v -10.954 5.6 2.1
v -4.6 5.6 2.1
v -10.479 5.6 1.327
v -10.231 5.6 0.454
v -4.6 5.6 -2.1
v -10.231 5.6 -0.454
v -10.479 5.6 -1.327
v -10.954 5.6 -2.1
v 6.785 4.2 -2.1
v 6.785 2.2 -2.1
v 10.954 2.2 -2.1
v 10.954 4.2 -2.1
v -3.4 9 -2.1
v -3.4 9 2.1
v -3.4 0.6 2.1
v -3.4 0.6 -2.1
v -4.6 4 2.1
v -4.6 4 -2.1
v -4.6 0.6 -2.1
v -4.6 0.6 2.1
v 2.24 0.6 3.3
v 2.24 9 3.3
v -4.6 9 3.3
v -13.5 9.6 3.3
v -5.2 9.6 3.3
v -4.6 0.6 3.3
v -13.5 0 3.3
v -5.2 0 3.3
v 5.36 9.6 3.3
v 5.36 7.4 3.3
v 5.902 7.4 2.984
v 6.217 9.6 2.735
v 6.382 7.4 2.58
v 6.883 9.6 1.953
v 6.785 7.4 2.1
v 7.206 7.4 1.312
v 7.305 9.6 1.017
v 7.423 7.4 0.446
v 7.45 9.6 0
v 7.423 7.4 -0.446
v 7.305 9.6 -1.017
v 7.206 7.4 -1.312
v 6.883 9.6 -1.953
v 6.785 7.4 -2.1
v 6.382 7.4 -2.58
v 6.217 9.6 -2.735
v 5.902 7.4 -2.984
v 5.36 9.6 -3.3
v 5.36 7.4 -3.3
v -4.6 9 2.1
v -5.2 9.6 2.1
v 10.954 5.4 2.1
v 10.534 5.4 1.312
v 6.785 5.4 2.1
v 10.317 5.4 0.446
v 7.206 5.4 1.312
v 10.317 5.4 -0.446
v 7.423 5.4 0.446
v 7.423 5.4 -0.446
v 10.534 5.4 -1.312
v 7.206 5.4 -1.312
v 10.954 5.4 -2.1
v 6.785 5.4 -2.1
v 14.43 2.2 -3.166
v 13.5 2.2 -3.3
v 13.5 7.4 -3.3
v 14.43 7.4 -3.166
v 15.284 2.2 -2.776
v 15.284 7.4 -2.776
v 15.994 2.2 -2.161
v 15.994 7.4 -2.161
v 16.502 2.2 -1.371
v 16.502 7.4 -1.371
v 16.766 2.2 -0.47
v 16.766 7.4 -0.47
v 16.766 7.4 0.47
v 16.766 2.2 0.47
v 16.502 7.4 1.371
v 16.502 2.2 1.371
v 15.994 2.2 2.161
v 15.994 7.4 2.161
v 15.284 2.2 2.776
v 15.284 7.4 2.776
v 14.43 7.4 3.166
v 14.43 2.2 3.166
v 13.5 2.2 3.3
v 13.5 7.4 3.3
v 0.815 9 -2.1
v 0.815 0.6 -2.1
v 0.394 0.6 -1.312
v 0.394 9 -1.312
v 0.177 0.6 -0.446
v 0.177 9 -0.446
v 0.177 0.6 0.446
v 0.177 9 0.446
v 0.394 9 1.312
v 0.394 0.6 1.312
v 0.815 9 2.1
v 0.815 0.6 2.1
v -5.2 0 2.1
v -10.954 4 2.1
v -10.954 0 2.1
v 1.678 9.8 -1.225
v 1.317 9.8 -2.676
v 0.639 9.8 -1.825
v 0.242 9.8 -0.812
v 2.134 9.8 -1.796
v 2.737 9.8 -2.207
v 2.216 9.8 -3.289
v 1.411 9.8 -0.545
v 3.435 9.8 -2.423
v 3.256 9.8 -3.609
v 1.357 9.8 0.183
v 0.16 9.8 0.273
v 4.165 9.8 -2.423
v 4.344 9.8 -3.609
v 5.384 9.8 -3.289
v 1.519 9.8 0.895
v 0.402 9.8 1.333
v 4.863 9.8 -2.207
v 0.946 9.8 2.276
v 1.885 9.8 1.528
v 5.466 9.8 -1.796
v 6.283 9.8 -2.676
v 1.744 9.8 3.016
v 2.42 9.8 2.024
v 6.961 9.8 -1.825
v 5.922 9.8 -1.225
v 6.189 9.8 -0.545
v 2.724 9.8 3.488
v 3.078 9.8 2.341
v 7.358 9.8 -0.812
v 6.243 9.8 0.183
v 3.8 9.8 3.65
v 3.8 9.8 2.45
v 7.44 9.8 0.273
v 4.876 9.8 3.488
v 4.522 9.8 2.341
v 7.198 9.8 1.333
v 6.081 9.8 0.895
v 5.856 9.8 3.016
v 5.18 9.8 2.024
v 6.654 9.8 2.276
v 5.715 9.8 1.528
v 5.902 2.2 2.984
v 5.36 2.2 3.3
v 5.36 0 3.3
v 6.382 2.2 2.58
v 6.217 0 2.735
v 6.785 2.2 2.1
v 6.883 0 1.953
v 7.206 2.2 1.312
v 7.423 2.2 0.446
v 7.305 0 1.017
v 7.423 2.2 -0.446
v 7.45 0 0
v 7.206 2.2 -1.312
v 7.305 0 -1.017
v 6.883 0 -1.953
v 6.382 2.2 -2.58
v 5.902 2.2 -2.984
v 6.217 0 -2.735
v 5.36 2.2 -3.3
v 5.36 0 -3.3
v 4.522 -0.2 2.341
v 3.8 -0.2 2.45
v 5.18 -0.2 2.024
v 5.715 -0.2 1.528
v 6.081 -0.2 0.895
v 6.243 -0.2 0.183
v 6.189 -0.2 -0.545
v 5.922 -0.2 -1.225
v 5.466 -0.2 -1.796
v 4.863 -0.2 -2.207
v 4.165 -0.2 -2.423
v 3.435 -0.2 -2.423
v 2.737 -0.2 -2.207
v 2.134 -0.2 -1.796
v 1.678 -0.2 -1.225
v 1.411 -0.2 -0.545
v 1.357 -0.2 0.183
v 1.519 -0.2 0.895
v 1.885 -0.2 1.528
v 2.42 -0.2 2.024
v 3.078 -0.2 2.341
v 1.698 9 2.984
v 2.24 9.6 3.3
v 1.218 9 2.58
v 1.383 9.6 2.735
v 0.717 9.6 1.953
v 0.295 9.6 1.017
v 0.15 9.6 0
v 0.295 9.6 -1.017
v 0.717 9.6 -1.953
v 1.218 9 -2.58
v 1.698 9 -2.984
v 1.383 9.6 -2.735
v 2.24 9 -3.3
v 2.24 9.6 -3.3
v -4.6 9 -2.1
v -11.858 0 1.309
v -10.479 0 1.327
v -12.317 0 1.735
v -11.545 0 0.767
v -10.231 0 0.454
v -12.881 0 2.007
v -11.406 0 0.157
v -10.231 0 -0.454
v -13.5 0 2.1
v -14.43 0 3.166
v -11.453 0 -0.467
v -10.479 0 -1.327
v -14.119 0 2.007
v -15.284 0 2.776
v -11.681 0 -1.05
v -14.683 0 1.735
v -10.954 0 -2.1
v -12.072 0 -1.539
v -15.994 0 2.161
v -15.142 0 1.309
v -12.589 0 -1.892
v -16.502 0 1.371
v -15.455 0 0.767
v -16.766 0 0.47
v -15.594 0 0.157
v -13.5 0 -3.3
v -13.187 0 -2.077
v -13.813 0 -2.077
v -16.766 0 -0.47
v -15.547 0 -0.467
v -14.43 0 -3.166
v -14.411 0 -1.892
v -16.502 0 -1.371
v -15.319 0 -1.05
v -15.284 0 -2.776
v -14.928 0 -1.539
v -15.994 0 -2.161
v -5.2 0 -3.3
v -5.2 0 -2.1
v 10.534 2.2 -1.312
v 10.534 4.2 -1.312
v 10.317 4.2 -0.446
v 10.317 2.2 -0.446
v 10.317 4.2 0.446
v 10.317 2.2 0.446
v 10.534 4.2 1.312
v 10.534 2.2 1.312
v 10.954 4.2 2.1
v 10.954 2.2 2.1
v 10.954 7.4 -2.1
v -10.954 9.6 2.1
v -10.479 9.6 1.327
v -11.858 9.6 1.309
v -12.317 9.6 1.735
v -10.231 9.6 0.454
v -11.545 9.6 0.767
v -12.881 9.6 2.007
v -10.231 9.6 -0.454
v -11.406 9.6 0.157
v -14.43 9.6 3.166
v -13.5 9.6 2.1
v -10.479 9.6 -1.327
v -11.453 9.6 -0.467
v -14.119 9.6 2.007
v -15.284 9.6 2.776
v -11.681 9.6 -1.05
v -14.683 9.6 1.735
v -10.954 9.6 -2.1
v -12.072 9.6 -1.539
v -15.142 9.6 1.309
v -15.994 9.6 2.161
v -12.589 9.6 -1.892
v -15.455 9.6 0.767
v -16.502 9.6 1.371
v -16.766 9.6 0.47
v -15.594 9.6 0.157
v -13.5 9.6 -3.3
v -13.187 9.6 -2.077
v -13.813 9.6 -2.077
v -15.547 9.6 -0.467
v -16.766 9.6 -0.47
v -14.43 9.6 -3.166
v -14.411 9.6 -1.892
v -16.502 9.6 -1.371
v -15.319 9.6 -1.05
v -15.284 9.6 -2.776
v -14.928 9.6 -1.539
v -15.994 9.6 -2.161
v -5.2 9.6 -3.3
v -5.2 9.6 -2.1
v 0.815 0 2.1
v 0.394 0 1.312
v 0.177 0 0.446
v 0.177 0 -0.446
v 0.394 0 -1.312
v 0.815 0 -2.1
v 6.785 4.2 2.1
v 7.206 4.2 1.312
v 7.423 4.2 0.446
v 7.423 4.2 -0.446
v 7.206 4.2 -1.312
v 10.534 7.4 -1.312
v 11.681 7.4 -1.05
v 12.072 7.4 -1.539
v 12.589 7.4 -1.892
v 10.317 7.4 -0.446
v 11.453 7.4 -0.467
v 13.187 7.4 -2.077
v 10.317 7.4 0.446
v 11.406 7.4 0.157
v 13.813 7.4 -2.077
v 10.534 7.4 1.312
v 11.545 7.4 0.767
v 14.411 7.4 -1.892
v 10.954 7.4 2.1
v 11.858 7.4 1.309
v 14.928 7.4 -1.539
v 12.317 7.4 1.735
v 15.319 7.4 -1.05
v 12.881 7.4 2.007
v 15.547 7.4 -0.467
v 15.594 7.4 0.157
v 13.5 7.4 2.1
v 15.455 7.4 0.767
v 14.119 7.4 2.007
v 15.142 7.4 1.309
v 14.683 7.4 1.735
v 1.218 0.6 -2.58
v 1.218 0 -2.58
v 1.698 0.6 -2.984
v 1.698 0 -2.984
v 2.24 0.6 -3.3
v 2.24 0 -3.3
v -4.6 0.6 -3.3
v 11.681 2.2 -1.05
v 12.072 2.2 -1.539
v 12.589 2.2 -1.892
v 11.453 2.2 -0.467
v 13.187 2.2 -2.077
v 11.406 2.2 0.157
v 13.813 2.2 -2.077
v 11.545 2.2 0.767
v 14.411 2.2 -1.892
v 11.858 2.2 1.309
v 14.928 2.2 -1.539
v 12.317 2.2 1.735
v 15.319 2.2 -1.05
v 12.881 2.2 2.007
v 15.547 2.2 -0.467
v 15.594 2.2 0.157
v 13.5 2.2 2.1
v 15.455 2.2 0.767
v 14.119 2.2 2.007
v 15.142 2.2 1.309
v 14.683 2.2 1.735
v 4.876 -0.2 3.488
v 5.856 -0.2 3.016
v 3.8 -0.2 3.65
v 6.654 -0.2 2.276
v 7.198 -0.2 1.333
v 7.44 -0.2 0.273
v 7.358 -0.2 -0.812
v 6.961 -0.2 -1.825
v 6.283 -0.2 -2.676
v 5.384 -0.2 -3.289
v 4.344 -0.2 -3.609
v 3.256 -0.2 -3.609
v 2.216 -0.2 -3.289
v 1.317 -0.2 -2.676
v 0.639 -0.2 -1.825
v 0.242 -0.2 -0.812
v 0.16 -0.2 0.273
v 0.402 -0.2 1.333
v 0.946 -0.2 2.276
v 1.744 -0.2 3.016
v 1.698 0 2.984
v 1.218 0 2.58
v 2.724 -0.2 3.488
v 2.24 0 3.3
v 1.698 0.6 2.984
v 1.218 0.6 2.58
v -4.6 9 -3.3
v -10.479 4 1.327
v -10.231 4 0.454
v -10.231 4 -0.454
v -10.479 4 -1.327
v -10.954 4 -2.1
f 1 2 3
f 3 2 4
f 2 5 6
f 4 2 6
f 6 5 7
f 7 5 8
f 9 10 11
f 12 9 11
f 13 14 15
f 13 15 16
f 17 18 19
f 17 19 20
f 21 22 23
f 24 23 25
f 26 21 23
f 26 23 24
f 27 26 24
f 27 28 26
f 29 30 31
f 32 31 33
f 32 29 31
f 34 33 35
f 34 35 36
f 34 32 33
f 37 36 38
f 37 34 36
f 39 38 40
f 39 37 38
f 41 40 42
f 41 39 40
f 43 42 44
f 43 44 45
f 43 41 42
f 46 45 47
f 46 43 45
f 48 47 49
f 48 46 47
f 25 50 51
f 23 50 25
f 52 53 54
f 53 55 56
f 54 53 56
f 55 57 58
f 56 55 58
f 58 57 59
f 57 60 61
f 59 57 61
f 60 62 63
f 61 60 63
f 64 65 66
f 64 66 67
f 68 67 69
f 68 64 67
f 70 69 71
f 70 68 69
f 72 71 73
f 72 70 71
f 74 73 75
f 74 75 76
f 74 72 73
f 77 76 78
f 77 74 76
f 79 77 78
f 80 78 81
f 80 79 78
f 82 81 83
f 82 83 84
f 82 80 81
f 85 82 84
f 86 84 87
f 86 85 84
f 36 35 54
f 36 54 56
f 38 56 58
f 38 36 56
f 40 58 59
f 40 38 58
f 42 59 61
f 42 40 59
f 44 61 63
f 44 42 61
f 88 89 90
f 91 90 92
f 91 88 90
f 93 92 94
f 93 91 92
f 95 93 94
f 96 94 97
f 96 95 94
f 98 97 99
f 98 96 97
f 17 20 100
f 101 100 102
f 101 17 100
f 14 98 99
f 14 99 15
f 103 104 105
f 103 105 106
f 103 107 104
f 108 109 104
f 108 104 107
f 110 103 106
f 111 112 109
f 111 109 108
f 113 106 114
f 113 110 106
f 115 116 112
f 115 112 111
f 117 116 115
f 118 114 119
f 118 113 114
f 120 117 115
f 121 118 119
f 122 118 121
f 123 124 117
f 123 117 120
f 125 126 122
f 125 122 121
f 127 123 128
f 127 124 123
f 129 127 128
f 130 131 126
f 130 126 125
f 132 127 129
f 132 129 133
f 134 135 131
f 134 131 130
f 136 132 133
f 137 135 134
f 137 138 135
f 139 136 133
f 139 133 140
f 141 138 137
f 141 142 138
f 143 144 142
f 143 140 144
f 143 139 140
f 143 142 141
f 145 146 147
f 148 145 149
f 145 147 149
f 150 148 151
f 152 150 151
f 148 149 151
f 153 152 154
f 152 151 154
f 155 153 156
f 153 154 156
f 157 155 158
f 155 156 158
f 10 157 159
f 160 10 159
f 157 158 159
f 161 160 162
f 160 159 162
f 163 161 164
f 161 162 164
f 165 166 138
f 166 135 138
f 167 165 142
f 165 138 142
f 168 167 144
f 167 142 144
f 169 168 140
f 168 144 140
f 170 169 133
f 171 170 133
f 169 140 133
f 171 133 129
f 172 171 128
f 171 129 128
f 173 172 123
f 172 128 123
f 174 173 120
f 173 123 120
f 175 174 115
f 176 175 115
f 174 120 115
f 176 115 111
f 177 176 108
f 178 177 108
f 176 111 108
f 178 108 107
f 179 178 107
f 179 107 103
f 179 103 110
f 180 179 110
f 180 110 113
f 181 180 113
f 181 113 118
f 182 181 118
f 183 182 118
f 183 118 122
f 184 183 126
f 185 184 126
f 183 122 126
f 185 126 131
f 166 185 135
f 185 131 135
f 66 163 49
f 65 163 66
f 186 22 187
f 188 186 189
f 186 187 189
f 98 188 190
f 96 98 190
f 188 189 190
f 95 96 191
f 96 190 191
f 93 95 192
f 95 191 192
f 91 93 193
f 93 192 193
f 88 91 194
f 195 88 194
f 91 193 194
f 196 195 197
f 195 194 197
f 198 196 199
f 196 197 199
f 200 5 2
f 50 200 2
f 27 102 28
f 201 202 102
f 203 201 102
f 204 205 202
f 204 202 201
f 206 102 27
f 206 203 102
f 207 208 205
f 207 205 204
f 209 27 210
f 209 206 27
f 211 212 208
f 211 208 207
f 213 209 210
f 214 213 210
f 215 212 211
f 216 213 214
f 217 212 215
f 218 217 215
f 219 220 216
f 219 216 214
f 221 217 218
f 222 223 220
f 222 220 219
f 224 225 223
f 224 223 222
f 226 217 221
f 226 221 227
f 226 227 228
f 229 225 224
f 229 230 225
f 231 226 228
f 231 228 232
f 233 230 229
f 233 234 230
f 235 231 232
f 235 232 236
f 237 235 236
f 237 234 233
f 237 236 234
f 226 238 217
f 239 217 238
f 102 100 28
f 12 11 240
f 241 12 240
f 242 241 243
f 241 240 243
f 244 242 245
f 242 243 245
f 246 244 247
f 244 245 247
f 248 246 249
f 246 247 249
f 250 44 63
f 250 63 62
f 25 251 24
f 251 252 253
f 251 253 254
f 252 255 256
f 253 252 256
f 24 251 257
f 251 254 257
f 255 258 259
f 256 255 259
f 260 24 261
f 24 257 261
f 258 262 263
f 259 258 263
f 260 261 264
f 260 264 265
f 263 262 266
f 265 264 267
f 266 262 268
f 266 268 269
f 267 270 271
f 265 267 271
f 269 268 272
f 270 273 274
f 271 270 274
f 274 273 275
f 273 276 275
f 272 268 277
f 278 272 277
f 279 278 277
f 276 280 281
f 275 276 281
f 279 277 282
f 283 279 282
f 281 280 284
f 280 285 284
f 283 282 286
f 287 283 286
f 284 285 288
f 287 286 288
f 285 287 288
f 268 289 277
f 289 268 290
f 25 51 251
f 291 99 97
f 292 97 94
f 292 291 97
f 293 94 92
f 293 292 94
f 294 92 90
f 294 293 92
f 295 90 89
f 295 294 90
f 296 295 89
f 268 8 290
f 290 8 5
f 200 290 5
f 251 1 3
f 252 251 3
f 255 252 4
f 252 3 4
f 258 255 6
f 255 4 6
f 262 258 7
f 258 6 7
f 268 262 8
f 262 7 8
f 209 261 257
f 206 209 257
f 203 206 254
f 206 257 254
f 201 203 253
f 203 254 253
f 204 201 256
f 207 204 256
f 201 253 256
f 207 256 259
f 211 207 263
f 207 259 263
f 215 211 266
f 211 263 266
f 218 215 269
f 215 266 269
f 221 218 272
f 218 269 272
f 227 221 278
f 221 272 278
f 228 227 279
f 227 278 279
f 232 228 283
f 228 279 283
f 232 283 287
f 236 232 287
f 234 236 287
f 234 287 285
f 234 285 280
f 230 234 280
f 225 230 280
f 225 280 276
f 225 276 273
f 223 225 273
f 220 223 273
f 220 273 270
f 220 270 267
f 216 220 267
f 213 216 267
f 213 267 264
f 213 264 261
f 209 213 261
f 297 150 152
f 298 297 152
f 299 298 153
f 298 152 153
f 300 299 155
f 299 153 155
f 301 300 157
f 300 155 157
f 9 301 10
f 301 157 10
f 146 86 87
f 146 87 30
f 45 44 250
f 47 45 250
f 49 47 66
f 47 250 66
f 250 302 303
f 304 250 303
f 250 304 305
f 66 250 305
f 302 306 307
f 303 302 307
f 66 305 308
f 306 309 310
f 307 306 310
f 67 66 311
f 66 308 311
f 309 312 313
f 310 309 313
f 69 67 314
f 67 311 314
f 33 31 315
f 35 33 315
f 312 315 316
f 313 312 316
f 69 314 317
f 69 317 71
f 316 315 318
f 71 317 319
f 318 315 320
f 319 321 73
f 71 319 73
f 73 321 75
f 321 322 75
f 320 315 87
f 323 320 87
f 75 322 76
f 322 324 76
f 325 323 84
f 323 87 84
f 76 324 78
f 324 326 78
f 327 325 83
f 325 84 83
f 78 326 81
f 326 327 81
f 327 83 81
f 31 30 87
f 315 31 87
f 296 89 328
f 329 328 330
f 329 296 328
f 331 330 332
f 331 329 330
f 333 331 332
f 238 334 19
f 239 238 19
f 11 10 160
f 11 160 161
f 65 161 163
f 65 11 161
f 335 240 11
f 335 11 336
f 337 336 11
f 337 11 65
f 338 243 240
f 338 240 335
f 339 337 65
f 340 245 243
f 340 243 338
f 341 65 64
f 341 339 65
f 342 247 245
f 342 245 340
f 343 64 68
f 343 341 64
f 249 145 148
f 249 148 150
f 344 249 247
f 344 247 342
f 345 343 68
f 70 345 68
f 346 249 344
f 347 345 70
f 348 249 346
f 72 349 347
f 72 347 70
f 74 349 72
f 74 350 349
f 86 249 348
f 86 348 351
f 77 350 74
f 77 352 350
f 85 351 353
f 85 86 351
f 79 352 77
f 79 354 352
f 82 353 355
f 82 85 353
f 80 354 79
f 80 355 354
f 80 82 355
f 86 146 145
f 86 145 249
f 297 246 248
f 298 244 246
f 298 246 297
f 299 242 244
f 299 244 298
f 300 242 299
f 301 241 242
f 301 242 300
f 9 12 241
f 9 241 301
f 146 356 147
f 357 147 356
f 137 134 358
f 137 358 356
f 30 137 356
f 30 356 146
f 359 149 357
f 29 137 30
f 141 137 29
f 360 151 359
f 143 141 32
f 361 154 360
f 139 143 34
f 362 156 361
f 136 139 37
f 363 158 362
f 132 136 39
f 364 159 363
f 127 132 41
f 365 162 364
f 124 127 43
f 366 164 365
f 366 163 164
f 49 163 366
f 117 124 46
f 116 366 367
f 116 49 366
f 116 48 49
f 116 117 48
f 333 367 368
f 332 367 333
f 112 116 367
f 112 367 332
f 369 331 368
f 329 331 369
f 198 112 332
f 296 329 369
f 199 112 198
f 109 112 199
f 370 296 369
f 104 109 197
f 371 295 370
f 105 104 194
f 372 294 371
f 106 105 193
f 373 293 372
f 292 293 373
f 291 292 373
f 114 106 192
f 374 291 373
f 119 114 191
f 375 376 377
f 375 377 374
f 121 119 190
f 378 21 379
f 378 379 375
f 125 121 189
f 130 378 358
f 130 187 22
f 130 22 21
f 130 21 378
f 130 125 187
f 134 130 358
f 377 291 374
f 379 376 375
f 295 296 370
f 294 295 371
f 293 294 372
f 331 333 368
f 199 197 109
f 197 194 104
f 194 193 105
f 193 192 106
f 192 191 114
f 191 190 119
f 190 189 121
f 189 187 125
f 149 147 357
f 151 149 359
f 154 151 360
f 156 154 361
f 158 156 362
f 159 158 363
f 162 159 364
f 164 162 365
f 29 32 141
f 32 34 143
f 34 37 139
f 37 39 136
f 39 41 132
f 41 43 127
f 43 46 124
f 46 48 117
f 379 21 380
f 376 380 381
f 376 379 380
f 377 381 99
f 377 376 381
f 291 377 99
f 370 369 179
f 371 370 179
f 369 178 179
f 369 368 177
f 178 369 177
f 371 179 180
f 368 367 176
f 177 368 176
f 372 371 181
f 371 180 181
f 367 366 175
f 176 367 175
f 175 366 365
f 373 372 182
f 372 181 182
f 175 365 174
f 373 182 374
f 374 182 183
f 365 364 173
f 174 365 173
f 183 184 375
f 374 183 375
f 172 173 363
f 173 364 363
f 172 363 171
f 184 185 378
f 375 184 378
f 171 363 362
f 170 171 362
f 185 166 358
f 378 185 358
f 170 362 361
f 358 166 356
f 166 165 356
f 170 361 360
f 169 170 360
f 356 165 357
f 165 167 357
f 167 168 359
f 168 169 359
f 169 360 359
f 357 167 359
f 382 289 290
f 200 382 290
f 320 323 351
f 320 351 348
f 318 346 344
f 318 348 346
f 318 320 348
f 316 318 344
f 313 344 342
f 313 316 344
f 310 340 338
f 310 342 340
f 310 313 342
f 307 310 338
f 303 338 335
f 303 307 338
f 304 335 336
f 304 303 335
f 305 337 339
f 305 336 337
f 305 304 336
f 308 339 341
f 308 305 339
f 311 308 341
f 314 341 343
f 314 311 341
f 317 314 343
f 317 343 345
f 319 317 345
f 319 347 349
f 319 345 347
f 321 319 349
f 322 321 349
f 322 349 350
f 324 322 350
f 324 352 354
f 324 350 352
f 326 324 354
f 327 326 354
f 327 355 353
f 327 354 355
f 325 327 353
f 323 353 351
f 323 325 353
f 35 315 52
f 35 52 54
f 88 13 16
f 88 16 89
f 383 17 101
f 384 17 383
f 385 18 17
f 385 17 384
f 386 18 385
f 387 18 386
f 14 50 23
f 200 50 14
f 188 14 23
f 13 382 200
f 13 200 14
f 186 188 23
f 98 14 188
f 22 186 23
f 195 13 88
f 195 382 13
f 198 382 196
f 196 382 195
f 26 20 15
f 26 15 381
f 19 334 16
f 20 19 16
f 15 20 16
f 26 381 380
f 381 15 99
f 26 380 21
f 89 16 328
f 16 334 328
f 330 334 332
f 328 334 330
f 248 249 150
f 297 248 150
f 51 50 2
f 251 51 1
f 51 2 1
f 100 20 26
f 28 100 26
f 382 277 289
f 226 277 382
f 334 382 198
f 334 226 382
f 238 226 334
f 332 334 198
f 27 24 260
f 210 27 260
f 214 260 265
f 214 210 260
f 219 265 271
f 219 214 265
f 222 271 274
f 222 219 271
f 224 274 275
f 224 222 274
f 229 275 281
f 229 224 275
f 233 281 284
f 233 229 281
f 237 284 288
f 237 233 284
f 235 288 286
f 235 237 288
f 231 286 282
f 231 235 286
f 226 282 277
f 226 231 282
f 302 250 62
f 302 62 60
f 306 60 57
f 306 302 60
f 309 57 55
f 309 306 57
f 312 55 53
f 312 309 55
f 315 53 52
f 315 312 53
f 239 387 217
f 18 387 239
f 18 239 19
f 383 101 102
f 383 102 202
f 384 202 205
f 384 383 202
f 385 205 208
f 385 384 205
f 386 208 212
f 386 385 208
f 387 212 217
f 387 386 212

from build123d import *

# Parameters (mm, degrees)
BOSS_EXTRUDE1_DEPTH = 9.6
SKETCH2_R           = 2.1
CUT_EXTRUDE1_DEPTH  = 20.628805364
SKETCH3_R           = 3.65
BOSS_EXTRUDE5_DEPTH = 5
SKETCH3_4_R         = 2.45
CUT_EXTRUDE4_DEPTH  = 5
CUT_EXTRUDE5_DEPTH  = 0.6
CUT_EXTRUDE6_DEPTH  = 2.2
CUT_EXTRUDE7_DEPTH  = 2
CUT_EXTRUDE8_START  = -4
CUT_EXTRUDE8_DEPTH  = 4
CHAMFER1_SIZE       = 0.6
CUT_EXTRUDE9_DEPTH  = 20.498782013


with BuildPart() as part:
    # Sketch1 → Boss-Extrude1 (new body)
    with BuildSketch(Plane(origin=(0, 0, 0), x_dir=(1, 0, 0), z_dir=(0, 1, 0))):
        with BuildLine():
            ThreePointArc((13.5, 3.3), (16.8, 0), (13.5, -3.3))
            Line((13.5, -3.3), (-13.5, -3.3))
            ThreePointArc((-13.5, -3.3), (-16.8, 0), (-13.5, 3.3))
            Line((-13.5, 3.3), (13.5, 3.3))
        make_face()
    extrude(amount=BOSS_EXTRUDE1_DEPTH)

    # Sketch2 → Cut-Extrude1 (cut, through all)
    with BuildSketch(Plane(origin=(0, 9.6, 0), x_dir=(1, 0, 0), z_dir=(0, 1, 0))):
        with Locations(Location((-13.5, 0, 0), (0, 0, 270))):
            Circle(SKETCH2_R)
    cut_extrude1 = extrude(amount=-CUT_EXTRUDE1_DEPTH, mode=Mode.SUBTRACT)

    # Mirror1: Cut-Extrude1 across plane
    add(cut_extrude1.mirror(Plane(origin=(0, 0, 0), x_dir=(0, 0, 1), z_dir=(1, 0, 0))), mode=Mode.SUBTRACT)

    # Sketch3 → Boss-Extrude5 (add, symmetric)
    with BuildSketch(Plane(origin=(0, 4.8, 0), x_dir=(1, 0, 0), z_dir=(0, 1, 0))):
        with Locations(Location((3.8, 0, 0), (0, 0, 270))):
            Circle(SKETCH3_R)
    extrude(amount=BOSS_EXTRUDE5_DEPTH, both=True)

    # Sketch3<4> → Cut-Extrude4 (cut, symmetric)
    with BuildSketch(Plane(origin=(0, 4.8, 0), x_dir=(1, 0, 0), z_dir=(0, 1, 0))):
        with Locations(Location((3.8, 0, 0), (0, 0, 270))):
            Circle(SKETCH3_4_R)
    extrude(amount=CUT_EXTRUDE4_DEPTH, both=True, mode=Mode.SUBTRACT)

    # Sketch6 → Cut-Extrude5 (cut)
    with BuildSketch(Plane(origin=(0, 9.6, 0), x_dir=(1, 0, 0), z_dir=(0, 1, 0))):
        with BuildLine():
            Line((-4.6, 3.3), (-4.6, -3.3))
            Line((-4.6, -3.3), (2.240352604, -3.3))
            ThreePointArc((2.240352604, -3.3), (0.15, 0), (2.240352604, 3.3))
            Line((2.240352604, 3.3), (-4.6, 3.3))
        make_face()
    cut_extrude5 = extrude(amount=-CUT_EXTRUDE5_DEPTH, mode=Mode.SUBTRACT)

    # Mirror2: Cut-Extrude5 across plane
    add(cut_extrude5.mirror(Plane.ZX.offset(4.8)), mode=Mode.SUBTRACT)

    # Sketch8 → Cut-Extrude6 (cut)
    with BuildSketch(Plane.XZ):
        with BuildLine():
            Line((13.5, 3.3), (5.359647396, 3.3))
            ThreePointArc((5.359647396, 3.3), (7.45, 0), (5.359647396, -3.3))
            Line((5.359647396, -3.3), (13.5, -3.3))
            ThreePointArc((13.5, -3.3), (16.8, 0), (13.5, 3.3))
        make_face()
    cut_extrude6 = extrude(amount=-CUT_EXTRUDE6_DEPTH, mode=Mode.SUBTRACT)

    # Mirror3: Cut-Extrude6 across plane
    add(cut_extrude6.mirror(Plane.ZX.offset(4.8)), mode=Mode.SUBTRACT)

    # Sketch9 → Cut-Extrude7 (cut)
    with BuildSketch(Plane(origin=(0, 7.4, 0), x_dir=(1, 0, 0), z_dir=(0, 1, 0))):
        with BuildLine():
            Line((6.785381048, 2.1), (10.954415588, 2.1))
            ThreePointArc((10.954415588, 2.1), (10.289796635, 0), (10.954415588, -2.1))
            Line((10.954415588, -2.1), (6.785381048, -2.1))
            ThreePointArc((6.785381048, -2.1), (7.45, 0), (6.785381048, 2.1))
        make_face()
    cut_extrude7 = extrude(amount=-CUT_EXTRUDE7_DEPTH, mode=Mode.SUBTRACT)

    # Mirror4: Cut-Extrude7 across plane
    add(cut_extrude7.mirror(Plane.ZX.offset(4.8)), mode=Mode.SUBTRACT)

    # Sketch11 → Cut-Extrude8 (cut)
    with BuildSketch(Plane(origin=(0, 9.6, 0), x_dir=(1, 0, 0), z_dir=(0, 1, 0)).offset(CUT_EXTRUDE8_START)):
        with BuildLine():
            Line((-10.954415588, 2.1), (-4.6, 2.1))
            Line((-4.6, 2.1), (-4.6, -2.1))
            Line((-4.6, -2.1), (-10.954415588, -2.1))
            ThreePointArc((-10.954415588, -2.1), (-10.2, 0), (-10.954415588, 2.1))
        make_face()
    cut_extrude8 = extrude(amount=CUT_EXTRUDE8_DEPTH, mode=Mode.SUBTRACT)

    # Mirror7: Cut-Extrude8 across plane
    add(cut_extrude8.mirror(Plane.ZX.offset(4.8)), mode=Mode.SUBTRACT)

    # Chamfer1
    chamfer1_edges = [part.edges().sort_by_distance(p)[0] for p in [
        (-4.6, 9.6, 2.7),
        (-4.6, 9.6, -2.7),
        (-4.6, 0, -2.7),
        (-4.6, 0, 2.7),
    ]]
    chamfer(chamfer1_edges, length=CHAMFER1_SIZE - 0.0001)  # a hair under: the kernel refuses the full size

    # Sketch13 → Cut-Extrude9 (cut, through all)
    with BuildSketch(Plane(origin=(0, 9, 0), x_dir=(1, 0, 0), z_dir=(0, 1, 0))):
        with BuildLine():
            Line((0.814618952, -2.1), (-3.4, -2.1))
            Line((-3.4, -2.1), (-3.4, 2.1))
            Line((-3.4, 2.1), (0.814618952, 2.1))
            ThreePointArc((0.814618952, 2.1), (0.15, 0), (0.814618952, -2.1))
        make_face()
    extrude(amount=-CUT_EXTRUDE9_DEPTH, mode=Mode.SUBTRACT)


solid = part.part
